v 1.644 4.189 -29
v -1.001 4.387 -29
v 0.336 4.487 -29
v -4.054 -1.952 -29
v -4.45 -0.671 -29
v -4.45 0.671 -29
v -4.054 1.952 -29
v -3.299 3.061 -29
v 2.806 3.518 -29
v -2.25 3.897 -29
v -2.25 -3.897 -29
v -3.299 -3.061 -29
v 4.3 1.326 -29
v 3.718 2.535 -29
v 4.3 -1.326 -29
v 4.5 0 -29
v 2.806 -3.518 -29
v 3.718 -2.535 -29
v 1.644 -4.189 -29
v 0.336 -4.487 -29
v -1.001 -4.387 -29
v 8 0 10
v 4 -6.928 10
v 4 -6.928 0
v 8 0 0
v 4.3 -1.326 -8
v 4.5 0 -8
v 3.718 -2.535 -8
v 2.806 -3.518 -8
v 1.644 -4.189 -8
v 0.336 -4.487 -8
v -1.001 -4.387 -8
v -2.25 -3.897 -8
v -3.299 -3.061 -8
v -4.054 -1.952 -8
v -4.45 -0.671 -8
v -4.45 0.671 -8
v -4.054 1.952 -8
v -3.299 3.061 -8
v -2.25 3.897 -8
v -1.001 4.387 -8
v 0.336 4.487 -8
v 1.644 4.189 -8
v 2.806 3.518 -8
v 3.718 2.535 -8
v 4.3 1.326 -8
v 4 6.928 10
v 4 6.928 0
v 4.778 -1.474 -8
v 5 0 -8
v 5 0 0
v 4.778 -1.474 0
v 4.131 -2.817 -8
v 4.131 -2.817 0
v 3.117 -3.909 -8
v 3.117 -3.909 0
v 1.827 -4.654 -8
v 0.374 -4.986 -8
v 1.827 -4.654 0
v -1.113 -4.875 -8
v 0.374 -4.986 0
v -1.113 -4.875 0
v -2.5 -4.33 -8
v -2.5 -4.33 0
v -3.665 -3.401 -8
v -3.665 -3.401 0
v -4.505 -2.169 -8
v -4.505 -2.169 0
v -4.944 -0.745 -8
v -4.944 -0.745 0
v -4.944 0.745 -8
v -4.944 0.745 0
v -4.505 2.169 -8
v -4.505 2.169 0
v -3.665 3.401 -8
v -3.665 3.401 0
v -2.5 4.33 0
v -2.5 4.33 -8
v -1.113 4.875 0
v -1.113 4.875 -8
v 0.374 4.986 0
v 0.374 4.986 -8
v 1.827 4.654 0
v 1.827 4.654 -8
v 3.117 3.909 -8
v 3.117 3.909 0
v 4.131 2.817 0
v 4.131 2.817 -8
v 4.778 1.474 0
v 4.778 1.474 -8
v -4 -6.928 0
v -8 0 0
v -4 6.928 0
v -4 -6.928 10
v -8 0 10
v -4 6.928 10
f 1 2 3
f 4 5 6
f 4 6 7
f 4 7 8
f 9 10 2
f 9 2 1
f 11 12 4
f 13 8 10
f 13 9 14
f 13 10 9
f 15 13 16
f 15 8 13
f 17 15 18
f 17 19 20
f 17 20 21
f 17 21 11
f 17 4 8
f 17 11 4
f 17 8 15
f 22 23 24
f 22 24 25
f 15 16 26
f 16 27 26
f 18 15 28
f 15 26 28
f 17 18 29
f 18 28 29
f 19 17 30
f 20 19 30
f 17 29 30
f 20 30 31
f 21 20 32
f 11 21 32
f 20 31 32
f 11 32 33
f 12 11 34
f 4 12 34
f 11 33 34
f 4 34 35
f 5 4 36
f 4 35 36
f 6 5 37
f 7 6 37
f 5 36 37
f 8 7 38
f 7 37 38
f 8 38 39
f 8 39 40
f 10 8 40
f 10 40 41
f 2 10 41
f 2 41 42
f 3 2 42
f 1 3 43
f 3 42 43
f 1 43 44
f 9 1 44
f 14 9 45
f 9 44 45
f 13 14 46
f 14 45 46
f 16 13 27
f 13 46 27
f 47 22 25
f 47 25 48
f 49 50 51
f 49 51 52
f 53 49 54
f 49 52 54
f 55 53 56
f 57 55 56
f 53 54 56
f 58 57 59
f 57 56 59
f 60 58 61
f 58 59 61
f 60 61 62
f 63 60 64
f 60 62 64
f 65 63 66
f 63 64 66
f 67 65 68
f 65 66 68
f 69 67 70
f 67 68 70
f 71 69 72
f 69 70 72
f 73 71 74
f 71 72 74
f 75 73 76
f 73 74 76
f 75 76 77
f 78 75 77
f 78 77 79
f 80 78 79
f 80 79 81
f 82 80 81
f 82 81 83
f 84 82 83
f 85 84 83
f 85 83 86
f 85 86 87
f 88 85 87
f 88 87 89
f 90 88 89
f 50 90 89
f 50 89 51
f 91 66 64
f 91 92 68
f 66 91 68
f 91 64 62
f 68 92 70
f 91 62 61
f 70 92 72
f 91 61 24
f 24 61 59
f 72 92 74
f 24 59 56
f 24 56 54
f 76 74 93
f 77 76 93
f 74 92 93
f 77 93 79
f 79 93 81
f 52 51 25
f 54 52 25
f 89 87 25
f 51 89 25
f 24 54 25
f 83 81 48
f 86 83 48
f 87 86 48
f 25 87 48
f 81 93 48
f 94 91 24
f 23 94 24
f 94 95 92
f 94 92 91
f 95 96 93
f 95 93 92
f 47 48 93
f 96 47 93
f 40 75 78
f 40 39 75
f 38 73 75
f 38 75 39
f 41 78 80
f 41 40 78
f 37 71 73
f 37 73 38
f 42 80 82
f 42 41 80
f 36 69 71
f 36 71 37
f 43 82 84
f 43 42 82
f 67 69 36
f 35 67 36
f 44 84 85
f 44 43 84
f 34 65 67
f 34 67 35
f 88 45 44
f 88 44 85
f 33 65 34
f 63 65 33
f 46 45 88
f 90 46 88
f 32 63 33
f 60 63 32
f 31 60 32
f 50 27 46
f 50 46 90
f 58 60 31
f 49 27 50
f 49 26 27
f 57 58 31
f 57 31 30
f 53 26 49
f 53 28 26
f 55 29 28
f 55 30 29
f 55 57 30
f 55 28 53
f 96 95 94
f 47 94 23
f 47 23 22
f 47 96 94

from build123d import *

# Parameters (mm, degrees)
EXTRUDE_1_DEPTH     = 10
SKETCH_3_R          = 4.5
SKETCH_3_R_2        = 2.5
EXTRUDE_2_DEPTH     = 120
SKETCH_5_R          = 5
SKETCH_5_R_2        = 4.5
EXTRUDE_3_DEPTH     = 45
SKETCH_6_R          = 4.5
SKETCH_6_R_2        = 2.5
EXTRUDE_5_DEPTH     = 25
CUT_EXTRUDE_START   = -100
SKETCH_7_R          = 4.5
CUT_EXTRUDE_1_DEPTH = 100
CUT_EXTRUDE_START_2 = -33
SKETCH_9_R          = 5
CUT_EXTRUDE_2_DEPTH = 33
SKETCH_8_R          = 4.5
EXTRUDE_6_DEPTH     = 29
CUT_EXTRUDE_START_3 = -4
SKETCH_10_R         = 5
SKETCH_10_R_2       = 4.5
CUT_EXTRUDE_3_DEPTH = 4


with BuildPart() as part:
    # 草图1 → 凸台-拉伸1 (new body)
    with BuildSketch(Plane.XY):
        Polygon((8, 0), (4, 6.92820323), (-4, 6.92820323), (-8, 0), (-4, -6.92820323), (4, -6.92820323), align=None)
    extrude(amount=EXTRUDE_1_DEPTH)

    # 草图3 → 凸台-拉伸2 (add)
    with BuildSketch(Plane(origin=(0, 0, 0), x_dir=(-1, 0, 0), z_dir=(0, 0, -1))):
        with Locations(Location((0, 0, 0), (0, 0, 180))):
            Circle(SKETCH_3_R)
        Circle(SKETCH_3_R_2, mode=Mode.SUBTRACT)
    extrude(amount=EXTRUDE_2_DEPTH)

    # 草图5 → 凸台-拉伸3 (add)
    with BuildSketch(Plane(origin=(0, 0, 0), x_dir=(-1, 0, 0), z_dir=(0, 0, -1))):
        with Locations(Location((0, 0, 0), (0, 0, 180))):
            Circle(SKETCH_5_R)
        Circle(SKETCH_5_R_2, mode=Mode.SUBTRACT)
    extrude(amount=EXTRUDE_3_DEPTH)

    # 草图6 → 凸台-拉伸5 (add)
    with BuildSketch(Plane(origin=(0, 0, -120), x_dir=(-1, 0, 0), z_dir=(0, 0, -1))):
        Circle(SKETCH_6_R)
        Circle(SKETCH_6_R_2, mode=Mode.SUBTRACT)
    extrude(amount=EXTRUDE_5_DEPTH)

    # 草图7 → 切除-拉伸1 (cut)
    with BuildSketch(Plane(origin=(0, 0, -145), x_dir=(-1, 0, 0), z_dir=(0, 0, -1)).offset(CUT_EXTRUDE_START)):
        Circle(SKETCH_7_R)
    extrude(amount=CUT_EXTRUDE_1_DEPTH, mode=Mode.SUBTRACT)

    # 草图9 → 切除-拉伸2 (cut)
    with BuildSketch(Plane(origin=(0, 0, -45), x_dir=(-1, 0, 0), z_dir=(0, 0, -1)).offset(CUT_EXTRUDE_START_2)):
        with Locations(Location((0, 0, 0), (0, 0, 180))):
            Circle(SKETCH_9_R)
    extrude(amount=CUT_EXTRUDE_2_DEPTH, mode=Mode.SUBTRACT)

    # 草图8 → 凸台-拉伸6 (add)
    with BuildSketch(Plane(origin=(0, 0, 0), x_dir=(-1, 0, 0), z_dir=(0, 0, -1))):
        with Locations(Location((0, 0, 0), (0, 0, 180))):
            Circle(SKETCH_8_R)
    extrude(amount=EXTRUDE_6_DEPTH)

    # 草图10 → 切除-拉伸3 (cut)
    with BuildSketch(Plane(origin=(0, 0, -12), x_dir=(-1, 0, 0), z_dir=(0, 0, -1)).offset(CUT_EXTRUDE_START_3)):
        with Locations(Location((0, 0, 0), (0, 0, 180))):
            Circle(SKETCH_10_R)
        with Locations(Location((0, 0, 0), (0, 0, 180))):
            Circle(SKETCH_10_R_2, mode=Mode.SUBTRACT)
    extrude(amount=CUT_EXTRUDE_3_DEPTH, mode=Mode.SUBTRACT)


solid = part.part
